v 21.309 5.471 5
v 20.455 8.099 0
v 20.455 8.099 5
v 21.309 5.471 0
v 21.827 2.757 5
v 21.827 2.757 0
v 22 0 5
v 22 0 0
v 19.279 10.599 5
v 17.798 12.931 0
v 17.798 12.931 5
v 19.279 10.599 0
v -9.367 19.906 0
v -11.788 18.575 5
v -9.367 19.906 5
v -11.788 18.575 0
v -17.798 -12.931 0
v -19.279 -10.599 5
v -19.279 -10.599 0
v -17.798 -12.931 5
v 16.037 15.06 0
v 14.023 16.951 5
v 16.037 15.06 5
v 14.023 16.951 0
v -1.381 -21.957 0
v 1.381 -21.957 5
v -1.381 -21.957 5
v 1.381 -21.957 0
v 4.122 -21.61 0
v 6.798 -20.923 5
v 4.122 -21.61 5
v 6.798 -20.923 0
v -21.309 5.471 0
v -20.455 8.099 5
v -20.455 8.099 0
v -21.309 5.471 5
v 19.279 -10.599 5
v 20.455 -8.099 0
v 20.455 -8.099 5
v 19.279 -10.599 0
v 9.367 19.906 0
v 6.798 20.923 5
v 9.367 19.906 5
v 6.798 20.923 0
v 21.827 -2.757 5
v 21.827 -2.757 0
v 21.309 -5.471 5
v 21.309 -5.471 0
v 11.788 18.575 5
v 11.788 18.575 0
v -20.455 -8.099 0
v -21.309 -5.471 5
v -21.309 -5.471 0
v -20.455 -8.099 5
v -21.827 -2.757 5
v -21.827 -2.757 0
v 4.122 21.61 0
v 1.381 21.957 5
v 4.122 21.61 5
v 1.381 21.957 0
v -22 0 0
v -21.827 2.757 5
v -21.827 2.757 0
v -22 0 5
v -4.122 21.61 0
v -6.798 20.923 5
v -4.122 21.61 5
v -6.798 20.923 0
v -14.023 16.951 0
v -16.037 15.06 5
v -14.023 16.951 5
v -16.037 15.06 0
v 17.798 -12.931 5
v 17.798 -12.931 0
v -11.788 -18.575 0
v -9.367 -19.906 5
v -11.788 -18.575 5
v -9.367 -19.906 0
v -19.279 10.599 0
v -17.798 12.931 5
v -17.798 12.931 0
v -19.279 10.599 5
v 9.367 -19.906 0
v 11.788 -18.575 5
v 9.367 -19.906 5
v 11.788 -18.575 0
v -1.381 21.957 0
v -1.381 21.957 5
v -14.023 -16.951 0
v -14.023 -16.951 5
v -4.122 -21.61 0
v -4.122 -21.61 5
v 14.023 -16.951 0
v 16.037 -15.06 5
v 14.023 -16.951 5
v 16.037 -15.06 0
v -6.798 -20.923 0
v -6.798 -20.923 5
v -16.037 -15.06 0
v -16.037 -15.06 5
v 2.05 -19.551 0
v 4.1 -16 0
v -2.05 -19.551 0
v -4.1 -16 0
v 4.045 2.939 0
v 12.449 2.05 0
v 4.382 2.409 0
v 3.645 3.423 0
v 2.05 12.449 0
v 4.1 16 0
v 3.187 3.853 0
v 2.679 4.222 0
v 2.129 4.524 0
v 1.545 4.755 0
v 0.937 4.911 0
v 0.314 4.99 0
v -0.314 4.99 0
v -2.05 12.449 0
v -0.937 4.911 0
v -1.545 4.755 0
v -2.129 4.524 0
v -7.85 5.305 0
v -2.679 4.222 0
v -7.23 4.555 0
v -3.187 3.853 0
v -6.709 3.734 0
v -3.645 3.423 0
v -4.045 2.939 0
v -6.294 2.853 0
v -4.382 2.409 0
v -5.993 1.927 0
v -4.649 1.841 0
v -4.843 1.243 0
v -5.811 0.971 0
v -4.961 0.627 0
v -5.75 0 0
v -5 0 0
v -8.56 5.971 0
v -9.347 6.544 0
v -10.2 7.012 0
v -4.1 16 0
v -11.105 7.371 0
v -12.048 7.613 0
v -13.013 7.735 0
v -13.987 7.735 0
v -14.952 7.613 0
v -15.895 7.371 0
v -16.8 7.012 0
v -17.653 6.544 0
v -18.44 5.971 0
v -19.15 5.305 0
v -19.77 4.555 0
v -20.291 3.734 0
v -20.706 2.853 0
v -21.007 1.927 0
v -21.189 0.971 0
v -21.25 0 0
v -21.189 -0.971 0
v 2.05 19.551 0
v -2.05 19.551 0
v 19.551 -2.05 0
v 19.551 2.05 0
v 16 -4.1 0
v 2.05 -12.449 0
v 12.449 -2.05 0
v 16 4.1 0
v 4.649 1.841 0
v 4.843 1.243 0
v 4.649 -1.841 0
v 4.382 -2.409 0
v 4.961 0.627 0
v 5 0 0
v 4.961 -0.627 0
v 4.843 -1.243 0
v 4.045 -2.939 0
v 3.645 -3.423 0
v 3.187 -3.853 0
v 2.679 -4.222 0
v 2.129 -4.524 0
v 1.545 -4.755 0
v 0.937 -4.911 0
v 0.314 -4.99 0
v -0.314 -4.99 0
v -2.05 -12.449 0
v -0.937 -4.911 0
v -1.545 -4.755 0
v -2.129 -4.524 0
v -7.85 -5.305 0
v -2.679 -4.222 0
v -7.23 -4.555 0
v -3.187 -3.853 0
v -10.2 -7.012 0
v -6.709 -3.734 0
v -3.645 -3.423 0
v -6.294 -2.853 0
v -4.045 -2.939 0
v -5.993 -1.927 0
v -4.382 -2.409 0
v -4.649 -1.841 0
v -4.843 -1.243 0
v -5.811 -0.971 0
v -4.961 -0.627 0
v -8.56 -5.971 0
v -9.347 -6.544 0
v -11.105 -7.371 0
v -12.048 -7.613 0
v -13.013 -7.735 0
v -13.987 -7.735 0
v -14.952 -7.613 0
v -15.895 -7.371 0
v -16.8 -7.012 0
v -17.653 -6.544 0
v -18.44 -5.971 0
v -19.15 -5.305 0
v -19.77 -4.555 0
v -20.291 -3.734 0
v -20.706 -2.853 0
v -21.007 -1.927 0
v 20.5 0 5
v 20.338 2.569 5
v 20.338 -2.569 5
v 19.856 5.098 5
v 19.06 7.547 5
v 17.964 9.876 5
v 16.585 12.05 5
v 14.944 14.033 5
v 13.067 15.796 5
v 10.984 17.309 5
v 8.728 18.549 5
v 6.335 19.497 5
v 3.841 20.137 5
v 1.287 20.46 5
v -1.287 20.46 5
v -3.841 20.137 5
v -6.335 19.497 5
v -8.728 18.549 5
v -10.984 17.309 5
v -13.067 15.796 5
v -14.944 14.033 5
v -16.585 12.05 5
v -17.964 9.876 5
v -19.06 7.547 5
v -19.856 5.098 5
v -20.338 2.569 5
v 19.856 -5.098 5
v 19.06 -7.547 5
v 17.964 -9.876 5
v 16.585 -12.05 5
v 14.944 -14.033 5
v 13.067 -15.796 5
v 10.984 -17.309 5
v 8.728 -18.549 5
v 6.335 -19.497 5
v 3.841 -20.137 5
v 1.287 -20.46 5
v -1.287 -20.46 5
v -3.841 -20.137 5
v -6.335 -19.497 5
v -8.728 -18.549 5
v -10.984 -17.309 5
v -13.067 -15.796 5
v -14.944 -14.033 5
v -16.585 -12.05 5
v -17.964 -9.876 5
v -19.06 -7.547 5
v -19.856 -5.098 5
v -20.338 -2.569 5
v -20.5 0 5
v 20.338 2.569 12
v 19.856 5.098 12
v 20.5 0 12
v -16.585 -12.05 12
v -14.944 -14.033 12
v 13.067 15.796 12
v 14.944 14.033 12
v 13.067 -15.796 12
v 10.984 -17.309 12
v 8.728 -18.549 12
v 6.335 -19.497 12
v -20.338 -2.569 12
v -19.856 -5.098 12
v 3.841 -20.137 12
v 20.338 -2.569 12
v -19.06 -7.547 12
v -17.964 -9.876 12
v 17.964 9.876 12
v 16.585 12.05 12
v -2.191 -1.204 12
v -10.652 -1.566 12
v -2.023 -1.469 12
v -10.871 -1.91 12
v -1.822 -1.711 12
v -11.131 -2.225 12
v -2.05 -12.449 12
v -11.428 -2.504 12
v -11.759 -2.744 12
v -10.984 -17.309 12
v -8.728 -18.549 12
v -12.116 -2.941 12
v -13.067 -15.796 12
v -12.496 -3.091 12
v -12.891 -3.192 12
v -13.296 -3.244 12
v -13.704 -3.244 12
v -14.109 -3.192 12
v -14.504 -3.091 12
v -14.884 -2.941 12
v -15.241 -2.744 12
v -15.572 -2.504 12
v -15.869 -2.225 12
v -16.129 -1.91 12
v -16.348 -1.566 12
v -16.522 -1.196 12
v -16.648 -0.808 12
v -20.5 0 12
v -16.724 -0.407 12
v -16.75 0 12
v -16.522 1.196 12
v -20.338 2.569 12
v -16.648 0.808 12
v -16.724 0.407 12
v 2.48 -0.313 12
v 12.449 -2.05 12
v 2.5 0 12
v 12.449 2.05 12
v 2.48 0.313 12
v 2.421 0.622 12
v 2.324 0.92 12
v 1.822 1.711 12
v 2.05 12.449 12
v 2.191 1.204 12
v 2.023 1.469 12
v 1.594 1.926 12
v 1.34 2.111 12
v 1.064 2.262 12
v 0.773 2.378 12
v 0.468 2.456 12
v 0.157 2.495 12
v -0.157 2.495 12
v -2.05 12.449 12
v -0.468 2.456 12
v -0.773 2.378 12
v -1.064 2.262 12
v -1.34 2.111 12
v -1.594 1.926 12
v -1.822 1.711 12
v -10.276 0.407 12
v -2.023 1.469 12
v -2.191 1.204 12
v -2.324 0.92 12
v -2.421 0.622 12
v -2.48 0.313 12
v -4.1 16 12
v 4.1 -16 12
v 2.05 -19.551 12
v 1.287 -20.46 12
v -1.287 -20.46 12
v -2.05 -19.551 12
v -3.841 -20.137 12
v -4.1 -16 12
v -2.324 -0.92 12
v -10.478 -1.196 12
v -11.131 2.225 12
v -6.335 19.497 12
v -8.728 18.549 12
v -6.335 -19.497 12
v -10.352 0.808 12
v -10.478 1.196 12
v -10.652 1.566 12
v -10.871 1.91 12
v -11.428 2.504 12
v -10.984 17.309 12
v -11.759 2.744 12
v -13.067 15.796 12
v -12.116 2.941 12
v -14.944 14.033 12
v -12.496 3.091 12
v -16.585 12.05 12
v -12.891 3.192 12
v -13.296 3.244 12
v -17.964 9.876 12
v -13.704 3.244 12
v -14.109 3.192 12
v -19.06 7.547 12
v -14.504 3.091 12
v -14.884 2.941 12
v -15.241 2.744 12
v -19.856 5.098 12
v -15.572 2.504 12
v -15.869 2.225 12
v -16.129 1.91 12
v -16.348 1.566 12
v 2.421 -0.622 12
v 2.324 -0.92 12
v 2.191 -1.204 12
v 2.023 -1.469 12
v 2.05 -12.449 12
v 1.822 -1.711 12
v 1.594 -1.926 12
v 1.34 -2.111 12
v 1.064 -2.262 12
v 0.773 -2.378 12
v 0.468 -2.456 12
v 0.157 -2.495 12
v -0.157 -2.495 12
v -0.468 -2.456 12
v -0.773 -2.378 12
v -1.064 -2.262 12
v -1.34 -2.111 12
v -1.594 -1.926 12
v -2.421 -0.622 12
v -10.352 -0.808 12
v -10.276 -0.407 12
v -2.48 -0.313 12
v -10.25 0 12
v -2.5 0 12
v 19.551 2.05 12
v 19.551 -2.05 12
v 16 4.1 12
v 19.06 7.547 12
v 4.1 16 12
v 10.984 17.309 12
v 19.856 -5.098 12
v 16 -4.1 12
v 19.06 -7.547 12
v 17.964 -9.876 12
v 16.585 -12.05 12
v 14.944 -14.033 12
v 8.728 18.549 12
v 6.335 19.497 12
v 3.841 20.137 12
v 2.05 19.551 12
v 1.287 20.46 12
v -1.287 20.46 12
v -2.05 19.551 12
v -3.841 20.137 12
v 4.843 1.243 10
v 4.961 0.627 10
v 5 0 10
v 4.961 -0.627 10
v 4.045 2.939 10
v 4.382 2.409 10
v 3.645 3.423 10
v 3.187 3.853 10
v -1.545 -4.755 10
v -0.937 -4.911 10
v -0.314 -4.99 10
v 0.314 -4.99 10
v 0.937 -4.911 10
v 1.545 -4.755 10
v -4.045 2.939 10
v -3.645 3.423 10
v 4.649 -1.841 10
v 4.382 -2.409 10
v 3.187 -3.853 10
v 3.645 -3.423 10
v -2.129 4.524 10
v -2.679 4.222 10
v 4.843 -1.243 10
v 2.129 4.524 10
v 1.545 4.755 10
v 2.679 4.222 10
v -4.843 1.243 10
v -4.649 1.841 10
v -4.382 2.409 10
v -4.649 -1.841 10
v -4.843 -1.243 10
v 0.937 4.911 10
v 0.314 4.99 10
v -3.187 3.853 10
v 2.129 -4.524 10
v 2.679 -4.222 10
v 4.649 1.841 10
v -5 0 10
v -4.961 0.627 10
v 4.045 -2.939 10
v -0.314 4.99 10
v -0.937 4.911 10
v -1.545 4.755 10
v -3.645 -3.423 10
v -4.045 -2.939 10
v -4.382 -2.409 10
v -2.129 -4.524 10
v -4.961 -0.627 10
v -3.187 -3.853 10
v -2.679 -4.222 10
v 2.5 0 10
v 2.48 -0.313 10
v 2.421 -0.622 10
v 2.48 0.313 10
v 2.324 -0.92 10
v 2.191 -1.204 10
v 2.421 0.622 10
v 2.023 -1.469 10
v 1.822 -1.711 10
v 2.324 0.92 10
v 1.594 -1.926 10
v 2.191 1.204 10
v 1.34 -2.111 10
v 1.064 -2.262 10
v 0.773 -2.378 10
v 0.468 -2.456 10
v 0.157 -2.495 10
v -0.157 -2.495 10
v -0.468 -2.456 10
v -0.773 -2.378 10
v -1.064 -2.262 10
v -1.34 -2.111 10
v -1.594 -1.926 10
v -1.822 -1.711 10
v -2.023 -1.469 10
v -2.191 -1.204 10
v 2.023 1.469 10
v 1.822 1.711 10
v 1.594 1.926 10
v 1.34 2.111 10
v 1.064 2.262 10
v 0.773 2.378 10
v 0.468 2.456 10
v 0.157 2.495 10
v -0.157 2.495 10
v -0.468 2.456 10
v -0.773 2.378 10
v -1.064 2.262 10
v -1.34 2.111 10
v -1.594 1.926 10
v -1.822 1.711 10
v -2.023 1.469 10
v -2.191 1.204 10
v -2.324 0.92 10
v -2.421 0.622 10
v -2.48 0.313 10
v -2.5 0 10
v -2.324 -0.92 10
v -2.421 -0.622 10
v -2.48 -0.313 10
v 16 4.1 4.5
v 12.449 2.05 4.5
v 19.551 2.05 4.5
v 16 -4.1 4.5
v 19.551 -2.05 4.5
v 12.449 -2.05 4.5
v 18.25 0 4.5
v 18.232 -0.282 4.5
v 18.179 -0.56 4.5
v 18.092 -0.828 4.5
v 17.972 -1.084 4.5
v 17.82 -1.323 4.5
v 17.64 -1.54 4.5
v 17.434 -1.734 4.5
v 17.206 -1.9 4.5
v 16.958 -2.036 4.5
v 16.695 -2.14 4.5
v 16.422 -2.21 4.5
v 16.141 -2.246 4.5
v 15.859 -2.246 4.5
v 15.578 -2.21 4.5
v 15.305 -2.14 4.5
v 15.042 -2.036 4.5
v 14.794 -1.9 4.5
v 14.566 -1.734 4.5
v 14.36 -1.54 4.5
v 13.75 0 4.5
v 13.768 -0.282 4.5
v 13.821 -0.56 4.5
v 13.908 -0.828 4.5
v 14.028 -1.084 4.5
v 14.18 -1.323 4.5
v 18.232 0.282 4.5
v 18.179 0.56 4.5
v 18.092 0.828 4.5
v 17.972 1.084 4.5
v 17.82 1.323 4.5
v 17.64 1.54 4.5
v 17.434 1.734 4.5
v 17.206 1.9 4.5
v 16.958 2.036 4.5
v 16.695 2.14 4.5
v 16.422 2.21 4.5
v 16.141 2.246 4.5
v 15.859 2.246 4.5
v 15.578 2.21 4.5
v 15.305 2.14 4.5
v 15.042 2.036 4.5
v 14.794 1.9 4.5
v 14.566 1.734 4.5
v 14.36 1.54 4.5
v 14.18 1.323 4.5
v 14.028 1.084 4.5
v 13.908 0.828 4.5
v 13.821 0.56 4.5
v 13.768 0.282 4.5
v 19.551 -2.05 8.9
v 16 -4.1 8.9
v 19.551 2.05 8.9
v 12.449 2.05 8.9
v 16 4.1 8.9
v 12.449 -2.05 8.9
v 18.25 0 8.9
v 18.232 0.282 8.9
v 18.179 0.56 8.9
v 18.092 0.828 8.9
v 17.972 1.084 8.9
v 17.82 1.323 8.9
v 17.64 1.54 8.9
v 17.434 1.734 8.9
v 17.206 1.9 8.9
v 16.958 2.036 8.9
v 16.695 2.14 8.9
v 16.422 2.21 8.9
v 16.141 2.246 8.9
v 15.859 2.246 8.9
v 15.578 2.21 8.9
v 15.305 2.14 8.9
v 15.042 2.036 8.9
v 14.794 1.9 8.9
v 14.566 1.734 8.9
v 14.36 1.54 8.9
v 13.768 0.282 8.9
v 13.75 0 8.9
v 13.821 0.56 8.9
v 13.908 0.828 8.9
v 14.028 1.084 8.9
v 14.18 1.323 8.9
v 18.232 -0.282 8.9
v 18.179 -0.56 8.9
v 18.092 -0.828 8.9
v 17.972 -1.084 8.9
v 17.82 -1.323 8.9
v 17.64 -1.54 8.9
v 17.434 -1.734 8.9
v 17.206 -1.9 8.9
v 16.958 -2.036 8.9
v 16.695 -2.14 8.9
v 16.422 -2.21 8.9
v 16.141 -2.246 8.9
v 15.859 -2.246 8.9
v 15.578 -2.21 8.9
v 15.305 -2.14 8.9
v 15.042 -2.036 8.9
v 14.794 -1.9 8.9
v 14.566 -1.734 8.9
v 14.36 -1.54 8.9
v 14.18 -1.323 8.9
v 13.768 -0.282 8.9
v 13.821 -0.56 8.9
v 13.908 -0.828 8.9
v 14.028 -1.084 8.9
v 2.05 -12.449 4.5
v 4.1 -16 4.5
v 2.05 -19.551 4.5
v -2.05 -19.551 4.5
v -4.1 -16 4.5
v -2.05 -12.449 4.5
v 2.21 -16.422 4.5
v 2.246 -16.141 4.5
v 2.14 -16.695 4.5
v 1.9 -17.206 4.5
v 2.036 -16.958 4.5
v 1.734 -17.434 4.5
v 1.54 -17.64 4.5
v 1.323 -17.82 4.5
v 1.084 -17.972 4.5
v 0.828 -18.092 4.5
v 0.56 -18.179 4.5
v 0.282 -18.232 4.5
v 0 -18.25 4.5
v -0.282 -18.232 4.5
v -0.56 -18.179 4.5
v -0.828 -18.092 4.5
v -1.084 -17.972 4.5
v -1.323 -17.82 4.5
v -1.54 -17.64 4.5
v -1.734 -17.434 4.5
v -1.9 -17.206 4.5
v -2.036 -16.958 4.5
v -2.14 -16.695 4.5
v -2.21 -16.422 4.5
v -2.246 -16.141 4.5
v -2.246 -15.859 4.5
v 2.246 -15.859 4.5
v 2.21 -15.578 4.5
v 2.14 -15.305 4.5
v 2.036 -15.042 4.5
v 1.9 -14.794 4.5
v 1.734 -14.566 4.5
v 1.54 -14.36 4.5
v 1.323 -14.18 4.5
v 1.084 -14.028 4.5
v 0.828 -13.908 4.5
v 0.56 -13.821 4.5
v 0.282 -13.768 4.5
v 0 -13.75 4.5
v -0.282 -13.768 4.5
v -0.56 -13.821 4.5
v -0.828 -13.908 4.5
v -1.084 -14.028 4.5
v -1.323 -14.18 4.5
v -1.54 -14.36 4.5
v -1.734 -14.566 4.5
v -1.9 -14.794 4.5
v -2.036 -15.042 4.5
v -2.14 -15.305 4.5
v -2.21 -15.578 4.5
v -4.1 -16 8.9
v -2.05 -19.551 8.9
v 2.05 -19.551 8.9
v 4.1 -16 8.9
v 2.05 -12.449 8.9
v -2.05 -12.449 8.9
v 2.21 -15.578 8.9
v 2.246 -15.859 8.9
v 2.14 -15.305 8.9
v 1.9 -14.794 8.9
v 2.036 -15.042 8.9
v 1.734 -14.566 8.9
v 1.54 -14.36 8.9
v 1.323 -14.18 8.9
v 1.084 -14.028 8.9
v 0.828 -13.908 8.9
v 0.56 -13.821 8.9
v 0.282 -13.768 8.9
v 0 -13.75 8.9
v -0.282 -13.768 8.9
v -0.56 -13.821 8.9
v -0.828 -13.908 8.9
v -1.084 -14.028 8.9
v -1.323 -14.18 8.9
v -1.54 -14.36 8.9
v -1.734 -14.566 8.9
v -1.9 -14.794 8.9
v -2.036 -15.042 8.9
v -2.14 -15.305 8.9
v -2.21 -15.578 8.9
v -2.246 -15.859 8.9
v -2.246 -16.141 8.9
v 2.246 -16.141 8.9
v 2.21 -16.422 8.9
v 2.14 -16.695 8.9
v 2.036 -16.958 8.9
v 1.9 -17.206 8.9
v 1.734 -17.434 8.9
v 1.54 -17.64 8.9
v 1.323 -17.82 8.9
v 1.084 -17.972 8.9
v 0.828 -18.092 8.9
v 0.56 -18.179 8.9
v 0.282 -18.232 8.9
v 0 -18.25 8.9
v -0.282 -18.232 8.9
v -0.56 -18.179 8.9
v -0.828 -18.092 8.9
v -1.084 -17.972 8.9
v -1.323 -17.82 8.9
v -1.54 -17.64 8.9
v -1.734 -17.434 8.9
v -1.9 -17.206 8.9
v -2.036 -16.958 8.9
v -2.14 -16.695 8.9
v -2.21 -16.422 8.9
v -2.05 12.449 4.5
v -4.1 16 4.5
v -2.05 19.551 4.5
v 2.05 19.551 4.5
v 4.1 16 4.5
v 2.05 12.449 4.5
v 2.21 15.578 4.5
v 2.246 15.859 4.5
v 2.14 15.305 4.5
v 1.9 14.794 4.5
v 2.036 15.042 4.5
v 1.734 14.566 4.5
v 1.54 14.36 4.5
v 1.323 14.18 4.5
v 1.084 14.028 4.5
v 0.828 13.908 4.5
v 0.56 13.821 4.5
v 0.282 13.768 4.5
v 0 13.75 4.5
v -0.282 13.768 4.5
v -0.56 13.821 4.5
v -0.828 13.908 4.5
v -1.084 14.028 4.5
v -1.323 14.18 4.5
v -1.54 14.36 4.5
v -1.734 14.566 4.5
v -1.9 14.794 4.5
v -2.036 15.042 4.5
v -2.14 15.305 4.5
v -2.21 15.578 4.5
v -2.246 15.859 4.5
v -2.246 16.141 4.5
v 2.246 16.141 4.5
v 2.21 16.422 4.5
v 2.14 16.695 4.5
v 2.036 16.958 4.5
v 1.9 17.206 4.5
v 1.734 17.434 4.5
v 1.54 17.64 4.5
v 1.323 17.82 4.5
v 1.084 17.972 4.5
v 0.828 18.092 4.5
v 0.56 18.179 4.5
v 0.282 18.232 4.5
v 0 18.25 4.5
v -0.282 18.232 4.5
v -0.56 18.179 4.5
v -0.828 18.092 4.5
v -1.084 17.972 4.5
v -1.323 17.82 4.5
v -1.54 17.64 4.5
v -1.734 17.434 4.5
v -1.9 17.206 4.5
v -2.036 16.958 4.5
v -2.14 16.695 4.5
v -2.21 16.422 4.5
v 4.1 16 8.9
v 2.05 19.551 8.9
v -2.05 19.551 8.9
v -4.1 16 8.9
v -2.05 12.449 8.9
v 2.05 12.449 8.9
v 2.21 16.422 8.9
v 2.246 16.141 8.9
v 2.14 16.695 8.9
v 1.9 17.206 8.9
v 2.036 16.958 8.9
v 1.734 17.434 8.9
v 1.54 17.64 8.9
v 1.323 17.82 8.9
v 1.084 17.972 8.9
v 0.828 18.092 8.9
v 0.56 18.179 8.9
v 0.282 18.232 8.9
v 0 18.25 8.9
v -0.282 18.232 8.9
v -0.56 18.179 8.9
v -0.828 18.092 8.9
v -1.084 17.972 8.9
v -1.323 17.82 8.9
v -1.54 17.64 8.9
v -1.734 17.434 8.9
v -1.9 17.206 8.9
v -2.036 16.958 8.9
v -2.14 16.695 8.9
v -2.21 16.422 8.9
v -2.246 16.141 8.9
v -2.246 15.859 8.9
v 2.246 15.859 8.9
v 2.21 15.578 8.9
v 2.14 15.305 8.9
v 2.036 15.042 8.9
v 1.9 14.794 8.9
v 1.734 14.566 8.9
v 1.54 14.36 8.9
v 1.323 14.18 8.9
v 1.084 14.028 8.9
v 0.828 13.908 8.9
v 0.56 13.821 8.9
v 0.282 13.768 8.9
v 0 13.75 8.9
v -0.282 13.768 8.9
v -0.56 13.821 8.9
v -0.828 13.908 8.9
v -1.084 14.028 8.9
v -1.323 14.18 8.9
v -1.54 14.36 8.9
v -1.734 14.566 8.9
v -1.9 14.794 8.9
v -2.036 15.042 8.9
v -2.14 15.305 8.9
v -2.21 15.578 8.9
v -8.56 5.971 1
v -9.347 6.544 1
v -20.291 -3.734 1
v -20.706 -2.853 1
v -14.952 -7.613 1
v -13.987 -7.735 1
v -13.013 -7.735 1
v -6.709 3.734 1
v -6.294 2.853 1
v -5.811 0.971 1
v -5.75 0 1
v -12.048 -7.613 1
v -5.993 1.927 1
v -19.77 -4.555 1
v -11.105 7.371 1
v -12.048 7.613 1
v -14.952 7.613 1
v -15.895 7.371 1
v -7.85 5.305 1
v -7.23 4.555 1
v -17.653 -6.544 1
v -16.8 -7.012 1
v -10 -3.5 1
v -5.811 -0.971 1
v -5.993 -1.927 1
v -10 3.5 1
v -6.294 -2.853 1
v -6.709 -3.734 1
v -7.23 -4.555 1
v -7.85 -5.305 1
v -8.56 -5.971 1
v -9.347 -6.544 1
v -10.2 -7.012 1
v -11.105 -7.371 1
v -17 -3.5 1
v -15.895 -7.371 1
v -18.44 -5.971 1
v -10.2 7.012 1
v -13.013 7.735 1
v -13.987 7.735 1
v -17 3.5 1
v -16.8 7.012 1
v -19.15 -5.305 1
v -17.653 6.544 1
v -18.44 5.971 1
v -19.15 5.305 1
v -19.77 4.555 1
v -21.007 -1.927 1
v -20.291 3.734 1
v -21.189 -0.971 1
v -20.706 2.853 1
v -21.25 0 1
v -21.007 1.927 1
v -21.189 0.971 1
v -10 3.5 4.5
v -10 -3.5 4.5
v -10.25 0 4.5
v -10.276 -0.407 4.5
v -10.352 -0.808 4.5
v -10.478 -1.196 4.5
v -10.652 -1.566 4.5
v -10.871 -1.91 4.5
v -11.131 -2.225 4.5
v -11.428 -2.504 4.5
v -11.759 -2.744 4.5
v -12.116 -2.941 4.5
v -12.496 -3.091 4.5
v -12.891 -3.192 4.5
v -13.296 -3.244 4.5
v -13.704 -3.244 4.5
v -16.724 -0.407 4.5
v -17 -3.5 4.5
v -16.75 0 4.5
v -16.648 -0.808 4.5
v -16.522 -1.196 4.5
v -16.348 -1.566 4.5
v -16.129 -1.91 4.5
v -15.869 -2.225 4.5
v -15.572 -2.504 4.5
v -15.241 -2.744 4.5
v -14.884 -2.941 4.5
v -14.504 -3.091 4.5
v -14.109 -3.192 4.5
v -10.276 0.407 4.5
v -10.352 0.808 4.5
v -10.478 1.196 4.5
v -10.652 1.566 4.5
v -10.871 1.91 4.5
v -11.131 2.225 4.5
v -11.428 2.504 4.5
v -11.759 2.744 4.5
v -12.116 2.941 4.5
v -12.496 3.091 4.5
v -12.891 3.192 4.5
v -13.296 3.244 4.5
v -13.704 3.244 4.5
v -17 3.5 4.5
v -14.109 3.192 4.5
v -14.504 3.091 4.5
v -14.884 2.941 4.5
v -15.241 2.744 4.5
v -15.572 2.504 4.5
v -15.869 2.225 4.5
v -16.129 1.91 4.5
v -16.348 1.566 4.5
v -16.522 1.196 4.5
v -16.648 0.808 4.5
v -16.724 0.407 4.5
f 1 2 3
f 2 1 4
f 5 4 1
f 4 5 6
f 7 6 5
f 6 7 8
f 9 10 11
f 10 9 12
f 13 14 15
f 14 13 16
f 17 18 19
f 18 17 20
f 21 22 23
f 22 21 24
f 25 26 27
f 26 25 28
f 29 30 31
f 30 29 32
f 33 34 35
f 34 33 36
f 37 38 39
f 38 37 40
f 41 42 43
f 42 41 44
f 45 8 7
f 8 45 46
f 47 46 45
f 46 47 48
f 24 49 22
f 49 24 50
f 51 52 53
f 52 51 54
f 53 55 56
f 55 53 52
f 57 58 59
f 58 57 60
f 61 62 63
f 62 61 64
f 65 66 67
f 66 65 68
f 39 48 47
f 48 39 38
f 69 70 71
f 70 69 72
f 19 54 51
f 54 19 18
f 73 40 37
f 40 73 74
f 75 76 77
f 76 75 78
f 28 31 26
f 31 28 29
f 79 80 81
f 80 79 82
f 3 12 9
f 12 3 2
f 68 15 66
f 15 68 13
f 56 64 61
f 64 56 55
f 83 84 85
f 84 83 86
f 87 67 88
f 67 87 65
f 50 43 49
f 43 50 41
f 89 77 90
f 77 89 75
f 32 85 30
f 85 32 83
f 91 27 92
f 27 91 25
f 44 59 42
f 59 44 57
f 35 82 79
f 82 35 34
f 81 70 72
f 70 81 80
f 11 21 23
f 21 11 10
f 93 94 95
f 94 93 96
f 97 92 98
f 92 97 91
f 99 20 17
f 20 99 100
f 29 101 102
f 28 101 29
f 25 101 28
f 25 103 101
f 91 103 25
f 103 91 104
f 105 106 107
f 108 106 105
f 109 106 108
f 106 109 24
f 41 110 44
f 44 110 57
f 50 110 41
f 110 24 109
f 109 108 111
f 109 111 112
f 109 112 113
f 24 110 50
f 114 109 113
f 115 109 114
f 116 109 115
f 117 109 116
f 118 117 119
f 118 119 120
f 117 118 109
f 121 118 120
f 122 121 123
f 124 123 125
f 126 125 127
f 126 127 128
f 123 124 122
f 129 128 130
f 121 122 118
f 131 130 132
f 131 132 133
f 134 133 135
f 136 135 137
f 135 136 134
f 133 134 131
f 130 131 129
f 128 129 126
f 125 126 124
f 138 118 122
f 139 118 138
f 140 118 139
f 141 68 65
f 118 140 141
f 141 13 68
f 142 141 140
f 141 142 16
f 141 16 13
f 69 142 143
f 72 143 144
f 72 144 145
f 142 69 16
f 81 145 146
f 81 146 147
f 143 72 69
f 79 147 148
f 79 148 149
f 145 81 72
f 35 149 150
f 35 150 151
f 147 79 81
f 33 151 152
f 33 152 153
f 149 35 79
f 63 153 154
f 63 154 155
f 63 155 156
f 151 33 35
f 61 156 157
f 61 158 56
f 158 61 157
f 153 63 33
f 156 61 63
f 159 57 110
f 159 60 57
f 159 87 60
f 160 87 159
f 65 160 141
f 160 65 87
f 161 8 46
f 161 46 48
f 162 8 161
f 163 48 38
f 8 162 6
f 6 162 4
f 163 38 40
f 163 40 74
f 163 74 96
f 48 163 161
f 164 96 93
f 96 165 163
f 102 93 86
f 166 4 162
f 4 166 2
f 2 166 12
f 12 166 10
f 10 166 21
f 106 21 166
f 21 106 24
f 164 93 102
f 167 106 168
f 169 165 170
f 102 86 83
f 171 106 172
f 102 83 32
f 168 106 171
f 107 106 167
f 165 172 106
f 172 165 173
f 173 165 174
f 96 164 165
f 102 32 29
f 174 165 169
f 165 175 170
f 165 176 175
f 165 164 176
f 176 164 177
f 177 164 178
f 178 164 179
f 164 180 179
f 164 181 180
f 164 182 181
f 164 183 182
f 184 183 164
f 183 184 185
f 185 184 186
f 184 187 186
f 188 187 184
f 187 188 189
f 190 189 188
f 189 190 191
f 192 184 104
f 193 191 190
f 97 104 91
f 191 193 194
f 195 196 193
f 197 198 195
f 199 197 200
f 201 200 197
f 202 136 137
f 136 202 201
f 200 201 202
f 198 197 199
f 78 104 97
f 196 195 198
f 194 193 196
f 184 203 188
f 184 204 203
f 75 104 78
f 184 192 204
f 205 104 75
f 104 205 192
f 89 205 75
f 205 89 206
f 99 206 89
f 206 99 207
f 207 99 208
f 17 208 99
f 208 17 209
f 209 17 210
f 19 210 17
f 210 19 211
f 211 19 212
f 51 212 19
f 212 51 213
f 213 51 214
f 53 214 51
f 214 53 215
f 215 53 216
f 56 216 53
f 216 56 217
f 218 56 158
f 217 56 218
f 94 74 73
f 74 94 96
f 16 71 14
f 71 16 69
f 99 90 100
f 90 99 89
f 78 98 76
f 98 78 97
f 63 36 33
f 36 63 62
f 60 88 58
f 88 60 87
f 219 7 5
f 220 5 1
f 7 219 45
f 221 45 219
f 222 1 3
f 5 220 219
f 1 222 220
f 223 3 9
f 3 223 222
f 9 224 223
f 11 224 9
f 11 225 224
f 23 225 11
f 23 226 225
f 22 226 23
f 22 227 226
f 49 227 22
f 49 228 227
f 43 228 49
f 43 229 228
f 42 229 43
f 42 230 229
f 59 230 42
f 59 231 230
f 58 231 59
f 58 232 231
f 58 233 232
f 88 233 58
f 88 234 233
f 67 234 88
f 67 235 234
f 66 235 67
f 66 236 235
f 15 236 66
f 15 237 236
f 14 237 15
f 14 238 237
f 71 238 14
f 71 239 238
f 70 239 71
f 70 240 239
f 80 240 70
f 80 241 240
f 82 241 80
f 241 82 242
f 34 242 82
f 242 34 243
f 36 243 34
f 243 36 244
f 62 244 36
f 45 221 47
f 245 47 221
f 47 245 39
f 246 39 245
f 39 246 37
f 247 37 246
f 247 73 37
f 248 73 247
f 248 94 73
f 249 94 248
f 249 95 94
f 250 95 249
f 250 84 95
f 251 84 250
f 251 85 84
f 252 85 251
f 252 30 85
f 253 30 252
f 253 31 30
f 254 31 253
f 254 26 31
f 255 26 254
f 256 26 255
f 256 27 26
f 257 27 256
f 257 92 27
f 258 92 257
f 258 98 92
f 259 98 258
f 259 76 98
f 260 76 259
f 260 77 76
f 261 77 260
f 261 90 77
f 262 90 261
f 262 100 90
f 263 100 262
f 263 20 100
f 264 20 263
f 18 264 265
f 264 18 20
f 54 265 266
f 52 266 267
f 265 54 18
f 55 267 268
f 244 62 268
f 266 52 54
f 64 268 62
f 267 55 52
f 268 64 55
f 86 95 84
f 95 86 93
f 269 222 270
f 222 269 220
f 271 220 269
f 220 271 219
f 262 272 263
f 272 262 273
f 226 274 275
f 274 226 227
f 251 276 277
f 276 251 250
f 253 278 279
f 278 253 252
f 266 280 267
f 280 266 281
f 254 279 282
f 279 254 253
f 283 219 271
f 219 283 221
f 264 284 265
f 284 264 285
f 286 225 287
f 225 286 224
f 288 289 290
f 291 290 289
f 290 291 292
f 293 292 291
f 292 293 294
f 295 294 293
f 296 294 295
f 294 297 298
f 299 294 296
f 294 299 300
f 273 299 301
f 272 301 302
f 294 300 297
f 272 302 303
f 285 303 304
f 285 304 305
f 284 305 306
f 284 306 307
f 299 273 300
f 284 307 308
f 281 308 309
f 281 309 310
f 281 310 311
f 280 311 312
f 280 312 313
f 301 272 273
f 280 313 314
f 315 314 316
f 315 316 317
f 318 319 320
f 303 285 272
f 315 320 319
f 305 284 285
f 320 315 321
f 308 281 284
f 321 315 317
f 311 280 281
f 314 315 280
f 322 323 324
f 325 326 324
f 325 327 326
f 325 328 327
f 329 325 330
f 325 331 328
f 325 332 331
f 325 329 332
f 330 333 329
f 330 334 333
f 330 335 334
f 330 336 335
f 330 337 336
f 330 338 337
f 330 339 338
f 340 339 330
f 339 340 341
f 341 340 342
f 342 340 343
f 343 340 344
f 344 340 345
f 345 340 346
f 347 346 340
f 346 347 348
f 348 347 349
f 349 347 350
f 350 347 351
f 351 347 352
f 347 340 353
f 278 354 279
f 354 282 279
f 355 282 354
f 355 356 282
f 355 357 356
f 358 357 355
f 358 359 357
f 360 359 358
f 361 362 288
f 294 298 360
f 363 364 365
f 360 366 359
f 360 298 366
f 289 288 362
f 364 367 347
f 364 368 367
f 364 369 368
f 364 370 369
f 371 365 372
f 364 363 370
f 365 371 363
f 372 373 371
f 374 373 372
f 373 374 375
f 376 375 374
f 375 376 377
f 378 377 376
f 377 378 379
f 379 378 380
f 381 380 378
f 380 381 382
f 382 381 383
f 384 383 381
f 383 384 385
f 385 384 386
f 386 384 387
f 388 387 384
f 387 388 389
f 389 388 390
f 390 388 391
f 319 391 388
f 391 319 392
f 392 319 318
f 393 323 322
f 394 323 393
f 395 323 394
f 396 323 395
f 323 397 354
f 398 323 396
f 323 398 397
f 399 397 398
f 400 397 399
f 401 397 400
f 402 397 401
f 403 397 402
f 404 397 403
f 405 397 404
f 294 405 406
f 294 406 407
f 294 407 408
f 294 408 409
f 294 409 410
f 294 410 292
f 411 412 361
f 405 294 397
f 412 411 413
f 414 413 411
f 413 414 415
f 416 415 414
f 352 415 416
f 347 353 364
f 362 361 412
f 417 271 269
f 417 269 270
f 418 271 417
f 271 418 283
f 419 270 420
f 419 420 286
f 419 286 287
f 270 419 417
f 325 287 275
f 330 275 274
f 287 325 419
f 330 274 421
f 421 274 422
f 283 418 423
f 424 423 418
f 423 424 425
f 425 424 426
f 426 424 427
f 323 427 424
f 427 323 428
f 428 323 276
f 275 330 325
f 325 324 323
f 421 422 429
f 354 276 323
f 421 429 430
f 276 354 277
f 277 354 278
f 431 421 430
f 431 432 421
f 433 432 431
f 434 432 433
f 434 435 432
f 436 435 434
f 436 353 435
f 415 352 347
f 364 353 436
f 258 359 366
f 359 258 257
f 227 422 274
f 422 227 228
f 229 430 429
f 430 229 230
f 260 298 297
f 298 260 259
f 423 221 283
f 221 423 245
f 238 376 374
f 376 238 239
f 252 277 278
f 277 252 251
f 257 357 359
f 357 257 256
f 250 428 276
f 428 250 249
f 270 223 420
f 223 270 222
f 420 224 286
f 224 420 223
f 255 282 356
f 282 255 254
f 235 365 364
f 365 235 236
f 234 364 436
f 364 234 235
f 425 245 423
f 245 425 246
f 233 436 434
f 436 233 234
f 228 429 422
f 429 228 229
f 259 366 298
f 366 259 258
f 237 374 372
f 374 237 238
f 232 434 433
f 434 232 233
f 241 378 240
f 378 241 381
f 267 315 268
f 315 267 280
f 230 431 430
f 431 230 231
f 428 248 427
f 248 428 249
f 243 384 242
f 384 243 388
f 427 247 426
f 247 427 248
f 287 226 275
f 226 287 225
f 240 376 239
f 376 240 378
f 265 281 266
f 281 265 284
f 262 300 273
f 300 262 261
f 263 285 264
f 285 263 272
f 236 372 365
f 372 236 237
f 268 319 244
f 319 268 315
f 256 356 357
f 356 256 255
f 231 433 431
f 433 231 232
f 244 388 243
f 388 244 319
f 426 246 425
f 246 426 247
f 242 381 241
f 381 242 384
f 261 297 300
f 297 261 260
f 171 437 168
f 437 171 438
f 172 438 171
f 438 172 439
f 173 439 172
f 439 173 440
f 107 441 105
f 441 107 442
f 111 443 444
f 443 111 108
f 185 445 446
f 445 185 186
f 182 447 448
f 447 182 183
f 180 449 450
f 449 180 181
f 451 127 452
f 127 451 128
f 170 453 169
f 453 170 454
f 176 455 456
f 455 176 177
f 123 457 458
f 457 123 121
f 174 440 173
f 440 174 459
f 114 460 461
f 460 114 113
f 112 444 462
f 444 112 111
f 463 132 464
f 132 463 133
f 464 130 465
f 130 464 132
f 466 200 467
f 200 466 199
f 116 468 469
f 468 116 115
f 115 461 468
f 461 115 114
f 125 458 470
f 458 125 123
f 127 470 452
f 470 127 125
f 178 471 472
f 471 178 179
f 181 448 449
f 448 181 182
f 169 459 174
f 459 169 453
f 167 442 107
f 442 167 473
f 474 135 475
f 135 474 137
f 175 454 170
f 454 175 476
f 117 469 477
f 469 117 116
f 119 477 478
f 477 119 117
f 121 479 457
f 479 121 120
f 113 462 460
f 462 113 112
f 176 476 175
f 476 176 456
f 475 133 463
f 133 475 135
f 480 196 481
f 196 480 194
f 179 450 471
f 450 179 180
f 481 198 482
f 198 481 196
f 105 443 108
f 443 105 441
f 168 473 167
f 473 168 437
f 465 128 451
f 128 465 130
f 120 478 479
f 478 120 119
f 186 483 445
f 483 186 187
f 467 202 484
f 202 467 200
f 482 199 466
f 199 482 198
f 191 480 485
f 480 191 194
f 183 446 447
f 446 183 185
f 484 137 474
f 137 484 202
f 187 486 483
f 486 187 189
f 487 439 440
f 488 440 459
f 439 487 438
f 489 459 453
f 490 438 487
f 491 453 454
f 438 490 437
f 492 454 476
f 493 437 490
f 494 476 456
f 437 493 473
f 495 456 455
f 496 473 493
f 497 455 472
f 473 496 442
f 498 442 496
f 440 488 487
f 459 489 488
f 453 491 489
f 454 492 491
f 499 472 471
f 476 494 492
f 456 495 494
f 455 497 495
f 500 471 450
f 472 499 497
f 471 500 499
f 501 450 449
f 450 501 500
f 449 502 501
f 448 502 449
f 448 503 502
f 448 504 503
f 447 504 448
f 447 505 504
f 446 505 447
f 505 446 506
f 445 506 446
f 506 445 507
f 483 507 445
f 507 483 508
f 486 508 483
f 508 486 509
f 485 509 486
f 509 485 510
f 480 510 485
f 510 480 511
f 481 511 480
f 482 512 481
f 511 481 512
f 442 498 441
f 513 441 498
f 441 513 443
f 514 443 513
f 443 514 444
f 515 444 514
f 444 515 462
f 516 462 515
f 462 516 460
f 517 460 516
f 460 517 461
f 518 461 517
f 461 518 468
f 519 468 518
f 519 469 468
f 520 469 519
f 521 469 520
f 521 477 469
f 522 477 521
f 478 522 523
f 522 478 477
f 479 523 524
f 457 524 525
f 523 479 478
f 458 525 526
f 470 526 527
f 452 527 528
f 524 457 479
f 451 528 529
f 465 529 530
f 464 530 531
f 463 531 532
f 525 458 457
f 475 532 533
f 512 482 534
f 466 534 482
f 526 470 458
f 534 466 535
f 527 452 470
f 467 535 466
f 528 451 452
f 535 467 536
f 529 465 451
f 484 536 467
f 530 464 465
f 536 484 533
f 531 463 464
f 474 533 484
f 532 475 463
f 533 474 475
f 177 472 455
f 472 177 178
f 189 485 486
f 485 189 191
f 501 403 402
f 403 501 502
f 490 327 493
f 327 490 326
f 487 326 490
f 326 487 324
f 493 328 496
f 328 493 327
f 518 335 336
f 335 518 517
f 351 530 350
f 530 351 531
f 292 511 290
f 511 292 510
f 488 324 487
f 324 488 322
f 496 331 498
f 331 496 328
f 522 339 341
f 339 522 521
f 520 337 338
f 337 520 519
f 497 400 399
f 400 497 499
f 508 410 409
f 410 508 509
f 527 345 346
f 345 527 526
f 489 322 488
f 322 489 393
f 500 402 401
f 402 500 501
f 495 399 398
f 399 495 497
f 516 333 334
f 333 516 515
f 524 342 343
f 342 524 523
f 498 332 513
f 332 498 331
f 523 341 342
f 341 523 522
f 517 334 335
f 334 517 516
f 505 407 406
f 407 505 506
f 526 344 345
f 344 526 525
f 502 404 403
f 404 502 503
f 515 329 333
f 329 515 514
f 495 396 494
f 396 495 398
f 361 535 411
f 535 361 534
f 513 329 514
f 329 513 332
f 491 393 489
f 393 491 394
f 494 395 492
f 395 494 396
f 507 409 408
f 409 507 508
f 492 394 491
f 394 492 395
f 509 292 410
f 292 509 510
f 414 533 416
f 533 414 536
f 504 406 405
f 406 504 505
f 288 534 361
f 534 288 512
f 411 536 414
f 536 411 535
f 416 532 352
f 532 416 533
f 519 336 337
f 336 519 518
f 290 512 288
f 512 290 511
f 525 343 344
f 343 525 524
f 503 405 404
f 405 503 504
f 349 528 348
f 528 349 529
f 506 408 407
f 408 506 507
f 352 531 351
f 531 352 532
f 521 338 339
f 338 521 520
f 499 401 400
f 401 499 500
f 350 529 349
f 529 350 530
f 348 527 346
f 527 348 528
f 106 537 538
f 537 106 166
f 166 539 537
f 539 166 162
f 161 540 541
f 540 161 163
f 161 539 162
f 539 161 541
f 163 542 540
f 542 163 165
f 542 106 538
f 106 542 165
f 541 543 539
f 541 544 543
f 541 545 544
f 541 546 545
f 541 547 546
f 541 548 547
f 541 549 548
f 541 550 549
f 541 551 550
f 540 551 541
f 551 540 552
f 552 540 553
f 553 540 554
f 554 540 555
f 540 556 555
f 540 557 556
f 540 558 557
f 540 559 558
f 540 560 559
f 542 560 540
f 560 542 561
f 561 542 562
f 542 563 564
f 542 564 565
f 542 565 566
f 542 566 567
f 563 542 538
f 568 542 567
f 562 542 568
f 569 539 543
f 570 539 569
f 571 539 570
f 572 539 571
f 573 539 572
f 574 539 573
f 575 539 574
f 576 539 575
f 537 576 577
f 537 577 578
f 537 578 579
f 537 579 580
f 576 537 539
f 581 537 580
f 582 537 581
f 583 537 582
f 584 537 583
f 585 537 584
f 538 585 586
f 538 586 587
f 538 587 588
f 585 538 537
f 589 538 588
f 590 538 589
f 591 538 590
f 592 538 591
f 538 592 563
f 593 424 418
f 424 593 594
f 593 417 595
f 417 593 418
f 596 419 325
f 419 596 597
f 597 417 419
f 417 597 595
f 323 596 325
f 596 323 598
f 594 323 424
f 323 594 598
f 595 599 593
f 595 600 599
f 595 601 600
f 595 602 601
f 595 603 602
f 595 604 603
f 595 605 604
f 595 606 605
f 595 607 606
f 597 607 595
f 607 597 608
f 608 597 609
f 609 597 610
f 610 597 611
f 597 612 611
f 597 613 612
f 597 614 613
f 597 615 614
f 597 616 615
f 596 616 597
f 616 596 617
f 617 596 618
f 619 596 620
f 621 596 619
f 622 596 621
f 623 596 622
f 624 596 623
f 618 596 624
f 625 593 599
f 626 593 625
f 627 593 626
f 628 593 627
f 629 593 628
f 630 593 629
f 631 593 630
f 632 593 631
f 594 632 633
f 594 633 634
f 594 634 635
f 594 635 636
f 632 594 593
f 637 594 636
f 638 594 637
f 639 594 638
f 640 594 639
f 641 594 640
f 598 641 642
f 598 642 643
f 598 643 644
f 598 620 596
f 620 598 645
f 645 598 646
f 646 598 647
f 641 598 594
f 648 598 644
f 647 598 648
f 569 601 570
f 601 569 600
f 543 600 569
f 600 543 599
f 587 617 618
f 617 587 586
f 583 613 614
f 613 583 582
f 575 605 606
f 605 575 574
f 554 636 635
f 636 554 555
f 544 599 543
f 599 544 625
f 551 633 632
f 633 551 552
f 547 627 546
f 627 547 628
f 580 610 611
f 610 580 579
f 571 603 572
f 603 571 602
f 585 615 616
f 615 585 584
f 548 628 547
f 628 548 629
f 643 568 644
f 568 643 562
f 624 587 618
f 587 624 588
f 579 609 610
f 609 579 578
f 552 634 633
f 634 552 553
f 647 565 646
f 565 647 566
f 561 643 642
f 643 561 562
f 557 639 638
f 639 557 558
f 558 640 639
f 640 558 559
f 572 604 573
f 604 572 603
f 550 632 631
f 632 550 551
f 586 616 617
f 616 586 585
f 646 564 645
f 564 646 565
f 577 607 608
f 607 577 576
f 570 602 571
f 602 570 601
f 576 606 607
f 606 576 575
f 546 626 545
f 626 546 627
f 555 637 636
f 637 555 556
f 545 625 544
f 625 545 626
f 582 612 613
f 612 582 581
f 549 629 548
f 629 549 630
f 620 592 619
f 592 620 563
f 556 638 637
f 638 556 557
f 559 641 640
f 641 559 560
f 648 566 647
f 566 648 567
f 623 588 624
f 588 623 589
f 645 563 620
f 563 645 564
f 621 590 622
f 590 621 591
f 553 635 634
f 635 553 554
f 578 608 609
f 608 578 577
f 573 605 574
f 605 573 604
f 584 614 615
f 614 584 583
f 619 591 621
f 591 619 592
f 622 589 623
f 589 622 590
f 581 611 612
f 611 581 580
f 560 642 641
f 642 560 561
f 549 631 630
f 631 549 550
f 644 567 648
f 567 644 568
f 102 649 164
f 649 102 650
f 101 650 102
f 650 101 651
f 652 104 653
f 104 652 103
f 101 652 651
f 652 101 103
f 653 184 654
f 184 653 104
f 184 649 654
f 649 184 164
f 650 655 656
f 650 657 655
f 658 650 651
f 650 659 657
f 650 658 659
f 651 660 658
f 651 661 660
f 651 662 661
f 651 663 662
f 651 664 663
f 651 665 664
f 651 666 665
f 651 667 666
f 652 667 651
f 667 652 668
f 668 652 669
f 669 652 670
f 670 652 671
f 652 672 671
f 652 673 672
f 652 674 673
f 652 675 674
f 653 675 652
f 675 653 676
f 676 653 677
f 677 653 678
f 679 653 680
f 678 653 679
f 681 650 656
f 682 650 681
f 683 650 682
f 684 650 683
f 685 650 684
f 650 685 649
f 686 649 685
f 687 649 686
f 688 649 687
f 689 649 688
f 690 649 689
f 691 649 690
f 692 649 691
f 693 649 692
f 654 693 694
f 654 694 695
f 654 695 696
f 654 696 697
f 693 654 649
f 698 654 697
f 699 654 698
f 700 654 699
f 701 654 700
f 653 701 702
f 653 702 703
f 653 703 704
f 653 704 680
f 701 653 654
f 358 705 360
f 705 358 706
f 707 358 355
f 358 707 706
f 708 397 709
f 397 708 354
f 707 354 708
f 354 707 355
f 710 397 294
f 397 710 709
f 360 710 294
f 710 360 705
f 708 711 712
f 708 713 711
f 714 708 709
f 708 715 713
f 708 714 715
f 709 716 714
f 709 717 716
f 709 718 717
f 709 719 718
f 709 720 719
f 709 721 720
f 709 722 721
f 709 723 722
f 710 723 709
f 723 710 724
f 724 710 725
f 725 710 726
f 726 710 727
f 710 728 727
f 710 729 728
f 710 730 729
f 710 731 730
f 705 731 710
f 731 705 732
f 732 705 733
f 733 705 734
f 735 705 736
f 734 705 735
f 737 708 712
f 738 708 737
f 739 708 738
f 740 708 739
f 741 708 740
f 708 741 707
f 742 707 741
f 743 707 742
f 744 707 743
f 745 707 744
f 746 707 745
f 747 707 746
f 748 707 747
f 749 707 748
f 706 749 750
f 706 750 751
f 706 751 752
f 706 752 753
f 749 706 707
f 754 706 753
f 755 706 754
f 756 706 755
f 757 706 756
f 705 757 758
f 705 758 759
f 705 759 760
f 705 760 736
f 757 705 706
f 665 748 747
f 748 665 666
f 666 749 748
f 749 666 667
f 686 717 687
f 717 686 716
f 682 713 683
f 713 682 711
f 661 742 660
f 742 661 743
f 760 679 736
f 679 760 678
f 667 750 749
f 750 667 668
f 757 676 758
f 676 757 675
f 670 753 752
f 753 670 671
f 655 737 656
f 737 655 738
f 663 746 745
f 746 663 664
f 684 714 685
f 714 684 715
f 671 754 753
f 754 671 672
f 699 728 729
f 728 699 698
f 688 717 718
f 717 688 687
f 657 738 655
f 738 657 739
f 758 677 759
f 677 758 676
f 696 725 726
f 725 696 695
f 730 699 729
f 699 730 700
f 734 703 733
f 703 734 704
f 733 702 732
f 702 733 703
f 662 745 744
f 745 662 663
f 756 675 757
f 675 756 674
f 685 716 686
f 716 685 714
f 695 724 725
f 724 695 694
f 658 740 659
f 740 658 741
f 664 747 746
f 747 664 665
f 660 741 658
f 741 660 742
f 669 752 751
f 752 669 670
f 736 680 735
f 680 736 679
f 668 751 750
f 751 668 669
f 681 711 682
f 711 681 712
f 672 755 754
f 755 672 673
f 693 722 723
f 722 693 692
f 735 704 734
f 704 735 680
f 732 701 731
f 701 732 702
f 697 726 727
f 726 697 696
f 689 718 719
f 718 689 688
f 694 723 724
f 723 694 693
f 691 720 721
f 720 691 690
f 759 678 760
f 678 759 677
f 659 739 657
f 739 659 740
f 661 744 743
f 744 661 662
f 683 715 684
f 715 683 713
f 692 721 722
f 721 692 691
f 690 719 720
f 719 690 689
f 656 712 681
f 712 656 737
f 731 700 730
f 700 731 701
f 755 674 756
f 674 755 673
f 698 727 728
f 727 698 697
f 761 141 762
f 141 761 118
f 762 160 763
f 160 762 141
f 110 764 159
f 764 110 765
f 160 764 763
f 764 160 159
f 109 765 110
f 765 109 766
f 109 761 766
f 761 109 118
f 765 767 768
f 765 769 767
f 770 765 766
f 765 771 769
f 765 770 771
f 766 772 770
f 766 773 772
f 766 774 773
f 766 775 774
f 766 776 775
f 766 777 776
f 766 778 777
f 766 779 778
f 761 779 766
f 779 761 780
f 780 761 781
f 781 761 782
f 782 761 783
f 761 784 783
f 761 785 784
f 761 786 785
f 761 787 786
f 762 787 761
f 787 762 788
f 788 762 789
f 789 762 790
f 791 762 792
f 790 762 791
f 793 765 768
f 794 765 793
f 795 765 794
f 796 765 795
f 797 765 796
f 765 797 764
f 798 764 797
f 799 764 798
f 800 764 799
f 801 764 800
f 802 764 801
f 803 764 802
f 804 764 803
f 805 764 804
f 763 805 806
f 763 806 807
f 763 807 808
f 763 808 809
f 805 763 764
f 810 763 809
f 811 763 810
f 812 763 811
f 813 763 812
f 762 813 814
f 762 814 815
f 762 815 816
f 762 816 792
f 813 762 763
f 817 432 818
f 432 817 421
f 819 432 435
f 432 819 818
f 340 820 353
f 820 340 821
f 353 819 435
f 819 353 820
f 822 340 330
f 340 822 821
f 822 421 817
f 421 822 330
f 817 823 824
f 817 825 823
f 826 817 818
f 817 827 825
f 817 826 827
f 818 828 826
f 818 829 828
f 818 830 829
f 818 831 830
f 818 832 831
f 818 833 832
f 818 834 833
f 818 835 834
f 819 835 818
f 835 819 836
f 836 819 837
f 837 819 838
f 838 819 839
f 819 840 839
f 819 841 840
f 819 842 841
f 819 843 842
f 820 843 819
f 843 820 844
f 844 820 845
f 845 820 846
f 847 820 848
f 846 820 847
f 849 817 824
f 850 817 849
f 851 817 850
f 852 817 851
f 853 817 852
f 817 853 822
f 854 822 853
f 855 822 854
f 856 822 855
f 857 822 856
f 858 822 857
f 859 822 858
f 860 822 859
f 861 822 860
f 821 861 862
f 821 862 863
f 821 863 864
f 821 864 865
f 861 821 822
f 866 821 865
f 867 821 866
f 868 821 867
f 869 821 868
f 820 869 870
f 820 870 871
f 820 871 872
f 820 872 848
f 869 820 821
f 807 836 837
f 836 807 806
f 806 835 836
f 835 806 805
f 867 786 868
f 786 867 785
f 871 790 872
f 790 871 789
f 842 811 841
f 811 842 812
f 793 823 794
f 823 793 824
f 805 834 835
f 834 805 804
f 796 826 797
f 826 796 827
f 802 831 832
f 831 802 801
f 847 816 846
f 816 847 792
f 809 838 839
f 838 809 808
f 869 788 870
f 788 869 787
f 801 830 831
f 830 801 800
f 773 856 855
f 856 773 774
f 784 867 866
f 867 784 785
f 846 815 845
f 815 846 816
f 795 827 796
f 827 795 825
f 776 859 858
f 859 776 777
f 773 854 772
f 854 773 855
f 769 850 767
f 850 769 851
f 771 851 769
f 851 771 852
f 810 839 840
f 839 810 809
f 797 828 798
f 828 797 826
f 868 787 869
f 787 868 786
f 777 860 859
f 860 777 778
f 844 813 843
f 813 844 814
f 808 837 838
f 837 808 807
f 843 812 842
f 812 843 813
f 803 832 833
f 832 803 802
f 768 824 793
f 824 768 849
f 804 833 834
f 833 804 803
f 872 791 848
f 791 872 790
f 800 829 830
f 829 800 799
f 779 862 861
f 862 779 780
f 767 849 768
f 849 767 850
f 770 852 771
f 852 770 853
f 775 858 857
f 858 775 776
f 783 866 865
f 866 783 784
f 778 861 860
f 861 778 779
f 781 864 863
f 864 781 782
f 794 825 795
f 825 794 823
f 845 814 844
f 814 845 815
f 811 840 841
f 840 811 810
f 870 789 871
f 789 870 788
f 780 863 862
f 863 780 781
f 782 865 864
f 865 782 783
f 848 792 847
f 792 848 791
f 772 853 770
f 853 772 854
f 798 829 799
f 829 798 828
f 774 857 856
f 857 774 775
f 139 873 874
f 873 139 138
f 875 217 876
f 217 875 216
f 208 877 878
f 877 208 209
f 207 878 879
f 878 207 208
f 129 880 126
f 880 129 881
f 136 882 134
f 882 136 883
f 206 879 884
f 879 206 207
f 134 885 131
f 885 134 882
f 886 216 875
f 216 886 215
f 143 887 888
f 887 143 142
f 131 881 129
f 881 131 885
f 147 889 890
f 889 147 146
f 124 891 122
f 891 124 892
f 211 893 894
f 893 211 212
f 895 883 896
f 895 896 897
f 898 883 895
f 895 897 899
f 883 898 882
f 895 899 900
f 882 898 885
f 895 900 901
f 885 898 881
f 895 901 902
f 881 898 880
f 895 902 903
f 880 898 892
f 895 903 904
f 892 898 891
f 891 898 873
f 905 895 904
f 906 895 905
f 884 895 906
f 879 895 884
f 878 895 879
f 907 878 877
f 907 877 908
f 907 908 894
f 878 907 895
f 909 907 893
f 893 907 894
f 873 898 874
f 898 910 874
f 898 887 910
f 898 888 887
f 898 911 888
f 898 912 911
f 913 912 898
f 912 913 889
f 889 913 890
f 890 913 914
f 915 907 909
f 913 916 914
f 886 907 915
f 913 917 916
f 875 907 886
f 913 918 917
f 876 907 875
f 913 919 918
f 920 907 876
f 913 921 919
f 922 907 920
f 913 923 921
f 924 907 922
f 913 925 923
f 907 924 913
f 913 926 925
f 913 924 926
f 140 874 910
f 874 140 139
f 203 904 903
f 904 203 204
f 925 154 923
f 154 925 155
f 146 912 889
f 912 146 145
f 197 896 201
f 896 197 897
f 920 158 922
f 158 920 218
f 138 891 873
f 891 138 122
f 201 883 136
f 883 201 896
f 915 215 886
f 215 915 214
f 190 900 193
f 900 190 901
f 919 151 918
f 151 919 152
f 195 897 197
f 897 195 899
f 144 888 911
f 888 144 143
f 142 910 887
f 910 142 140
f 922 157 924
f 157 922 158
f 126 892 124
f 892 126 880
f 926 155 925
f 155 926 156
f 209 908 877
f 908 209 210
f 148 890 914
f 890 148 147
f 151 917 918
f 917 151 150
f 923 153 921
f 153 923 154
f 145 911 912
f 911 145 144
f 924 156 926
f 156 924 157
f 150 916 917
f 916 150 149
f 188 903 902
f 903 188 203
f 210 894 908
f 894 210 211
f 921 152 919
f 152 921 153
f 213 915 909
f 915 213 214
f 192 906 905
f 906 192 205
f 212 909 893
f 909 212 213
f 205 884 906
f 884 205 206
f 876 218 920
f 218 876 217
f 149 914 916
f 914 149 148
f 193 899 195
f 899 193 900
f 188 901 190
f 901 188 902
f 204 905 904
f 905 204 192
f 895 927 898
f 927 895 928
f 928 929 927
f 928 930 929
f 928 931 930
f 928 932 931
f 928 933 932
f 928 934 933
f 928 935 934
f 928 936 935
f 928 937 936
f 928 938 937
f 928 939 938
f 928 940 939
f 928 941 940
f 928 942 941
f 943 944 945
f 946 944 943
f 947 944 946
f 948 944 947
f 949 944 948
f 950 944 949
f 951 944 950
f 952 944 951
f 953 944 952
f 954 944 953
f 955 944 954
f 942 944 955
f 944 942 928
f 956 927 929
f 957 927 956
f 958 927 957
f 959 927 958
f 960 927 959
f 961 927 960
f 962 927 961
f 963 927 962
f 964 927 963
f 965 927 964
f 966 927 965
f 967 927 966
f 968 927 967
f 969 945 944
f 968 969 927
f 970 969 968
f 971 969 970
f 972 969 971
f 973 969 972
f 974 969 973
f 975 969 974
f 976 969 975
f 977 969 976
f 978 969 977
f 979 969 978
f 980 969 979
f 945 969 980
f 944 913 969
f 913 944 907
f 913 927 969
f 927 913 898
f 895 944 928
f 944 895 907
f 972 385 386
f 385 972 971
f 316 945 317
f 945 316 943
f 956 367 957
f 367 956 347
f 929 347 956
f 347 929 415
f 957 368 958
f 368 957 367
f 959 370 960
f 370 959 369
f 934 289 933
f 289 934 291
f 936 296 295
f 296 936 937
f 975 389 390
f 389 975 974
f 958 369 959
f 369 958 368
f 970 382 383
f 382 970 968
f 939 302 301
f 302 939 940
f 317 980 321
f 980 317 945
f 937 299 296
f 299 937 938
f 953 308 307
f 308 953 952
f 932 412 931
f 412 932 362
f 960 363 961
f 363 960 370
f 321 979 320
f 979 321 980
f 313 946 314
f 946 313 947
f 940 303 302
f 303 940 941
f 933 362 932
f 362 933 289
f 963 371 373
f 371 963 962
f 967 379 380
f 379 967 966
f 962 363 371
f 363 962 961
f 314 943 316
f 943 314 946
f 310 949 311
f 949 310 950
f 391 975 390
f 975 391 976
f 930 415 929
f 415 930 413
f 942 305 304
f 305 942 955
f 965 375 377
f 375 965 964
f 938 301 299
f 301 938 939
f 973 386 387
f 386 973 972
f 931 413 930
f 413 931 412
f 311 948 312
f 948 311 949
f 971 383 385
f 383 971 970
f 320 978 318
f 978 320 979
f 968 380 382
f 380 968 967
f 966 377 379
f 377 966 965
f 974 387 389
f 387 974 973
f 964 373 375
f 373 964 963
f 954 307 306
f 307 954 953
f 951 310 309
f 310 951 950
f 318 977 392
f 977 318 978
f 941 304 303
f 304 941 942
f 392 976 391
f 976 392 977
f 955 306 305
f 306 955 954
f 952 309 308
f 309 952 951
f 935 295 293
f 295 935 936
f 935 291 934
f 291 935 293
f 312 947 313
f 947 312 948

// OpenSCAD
margen_error=0.5;

//Tuercas M4 
radio_tuercas_M4=3.85+(margen_error/2);
alto_tuerca_M4=3.1;
//alto_hexagono_tuerca_ciega_M4=5.5;
alto_hexagono_tuerca_ciega_M4=4.5;
radio_tornillo_M4=2+(margen_error/2);

//Bulón chico
radio_cabeza_bulon=(15/2)+(margen_error/2);
alto_cilindro_cabeza_bulon=1;
lado_traba_bulon=7;
alto_traba_bulon=3.5;
alto_tornillo_bulon=15;
radio_tornillo_bulon=(6/2)+(margen_error/2);

/*
//Bulón grande
radio_cabeza_bulon=(18/2)+(margen_error/2);
alto_cilindro_cabeza_bulon=1;
lado_traba_bulon=9;
alto_traba_bulon=4.5;
alto_tornillo_bulon=21;
radio_tornillo_bulon=(7.7/2)+(margen_error/2);
*/

radio_exterior_cabezal=22;
radio_interior_cabezal=20.5;
alto_exterior_cabezal=5;
alto_interior_cabezal=7;
alto_total_cabezal=alto_exterior_cabezal+alto_interior_cabezal;

radio_ubicacion_electrodos=16; //Radio en el que van a estar los electrodos respecto del centro del cabezal
separacion_electrodo=0; //Distancia más chica de un electrodo al eje. Poner en 0 para electrodos sobre los ejes
//angulo_RL=225;

radio_microfono=5;
alto_microfono=10;
radio_cable_microfono=2.5;

/*
echo("Diametro tuercas",radio_tuercas*2);
*/


//Tuerca, tuerca ciega y tornillo M4
module tuerca_M4(){
    cylinder(r=radio_tuercas_M4, h=alto_tuerca_M4, $fn=6);
}

module tuerca_ciega_M4(){
    cylinder(r=radio_tuercas_M4, h=alto_hexagono_tuerca_ciega_M4, $fn=6);
    translate([0, 0, alto_hexagono_tuerca_ciega_M4]) cylinder(r1=3, r2=1.5, h=3.5, $fn=50);
}

module tornillo_M4(){
    cylinder(r=radio_tornillo_M4, h=25, $fn=50);
}


module microfono(){
    cylinder(r=radio_microfono, h=alto_microfono, $fn=50);
    cylinder(r=radio_cable_microfono, h=alto_total_cabezal, $fn=50);
}


module cabezal(){
    cylinder(r=radio_exterior_cabezal, h=alto_exterior_cabezal, $fn=50);
    translate([0, 0, alto_exterior_cabezal])
        cylinder(r=radio_interior_cabezal, h=alto_interior_cabezal, $fn=50);
}

//Electrodo M4
module electrodo_M4(){
    rotate([180, 0, 30])
        translate([0, 0, -alto_hexagono_tuerca_ciega_M4])
            tuerca_ciega_M4();
    rotate([0, 0, 30])
        translate([0, 0, alto_total_cabezal-alto_tuerca_M4])
            tuerca_M4();
    tornillo_M4();
}

//Electrodo bulón

module electrodo_bulon(){
    cylinder(r=radio_cabeza_bulon, h=alto_cilindro_cabeza_bulon, $fn=50);
    rotate([-180, 0, 0])
        cylinder(r1=radio_cabeza_bulon, r2=0, h=3, $fn=50);
    translate([-lado_traba_bulon/2, -lado_traba_bulon/2, alto_cilindro_cabeza_bulon])
        cube([lado_traba_bulon, lado_traba_bulon, alto_traba_bulon]);
    translate([0, 0, alto_cilindro_cabeza_bulon+alto_traba_bulon])
        cylinder(r=radio_tornillo_bulon, h=alto_tornillo_bulon, $fn=50);
}

//!electrodo_bulon();

module grupo_de_electrodos_M4(){
    angulo_electrodo=90;//Electrodos a 90 grados
    //angulo_electrodo=120;//Electrodos a 60 grados
    for(i=[0,-angulo_electrodo, +angulo_electrodo]){
        rotate([0, 0, i])
            translate([radio_ubicacion_electrodos, 0, 0])
               electrodo_M4();
    }
}

//!grupo_de_electrodos_M4();

difference(){
    cabezal();
    microfono();
    grupo_de_electrodos_M4();
    translate([-((radio_exterior_cabezal-radio_microfono)/2+radio_microfono), 0, 0])
        electrodo_bulon();
}
